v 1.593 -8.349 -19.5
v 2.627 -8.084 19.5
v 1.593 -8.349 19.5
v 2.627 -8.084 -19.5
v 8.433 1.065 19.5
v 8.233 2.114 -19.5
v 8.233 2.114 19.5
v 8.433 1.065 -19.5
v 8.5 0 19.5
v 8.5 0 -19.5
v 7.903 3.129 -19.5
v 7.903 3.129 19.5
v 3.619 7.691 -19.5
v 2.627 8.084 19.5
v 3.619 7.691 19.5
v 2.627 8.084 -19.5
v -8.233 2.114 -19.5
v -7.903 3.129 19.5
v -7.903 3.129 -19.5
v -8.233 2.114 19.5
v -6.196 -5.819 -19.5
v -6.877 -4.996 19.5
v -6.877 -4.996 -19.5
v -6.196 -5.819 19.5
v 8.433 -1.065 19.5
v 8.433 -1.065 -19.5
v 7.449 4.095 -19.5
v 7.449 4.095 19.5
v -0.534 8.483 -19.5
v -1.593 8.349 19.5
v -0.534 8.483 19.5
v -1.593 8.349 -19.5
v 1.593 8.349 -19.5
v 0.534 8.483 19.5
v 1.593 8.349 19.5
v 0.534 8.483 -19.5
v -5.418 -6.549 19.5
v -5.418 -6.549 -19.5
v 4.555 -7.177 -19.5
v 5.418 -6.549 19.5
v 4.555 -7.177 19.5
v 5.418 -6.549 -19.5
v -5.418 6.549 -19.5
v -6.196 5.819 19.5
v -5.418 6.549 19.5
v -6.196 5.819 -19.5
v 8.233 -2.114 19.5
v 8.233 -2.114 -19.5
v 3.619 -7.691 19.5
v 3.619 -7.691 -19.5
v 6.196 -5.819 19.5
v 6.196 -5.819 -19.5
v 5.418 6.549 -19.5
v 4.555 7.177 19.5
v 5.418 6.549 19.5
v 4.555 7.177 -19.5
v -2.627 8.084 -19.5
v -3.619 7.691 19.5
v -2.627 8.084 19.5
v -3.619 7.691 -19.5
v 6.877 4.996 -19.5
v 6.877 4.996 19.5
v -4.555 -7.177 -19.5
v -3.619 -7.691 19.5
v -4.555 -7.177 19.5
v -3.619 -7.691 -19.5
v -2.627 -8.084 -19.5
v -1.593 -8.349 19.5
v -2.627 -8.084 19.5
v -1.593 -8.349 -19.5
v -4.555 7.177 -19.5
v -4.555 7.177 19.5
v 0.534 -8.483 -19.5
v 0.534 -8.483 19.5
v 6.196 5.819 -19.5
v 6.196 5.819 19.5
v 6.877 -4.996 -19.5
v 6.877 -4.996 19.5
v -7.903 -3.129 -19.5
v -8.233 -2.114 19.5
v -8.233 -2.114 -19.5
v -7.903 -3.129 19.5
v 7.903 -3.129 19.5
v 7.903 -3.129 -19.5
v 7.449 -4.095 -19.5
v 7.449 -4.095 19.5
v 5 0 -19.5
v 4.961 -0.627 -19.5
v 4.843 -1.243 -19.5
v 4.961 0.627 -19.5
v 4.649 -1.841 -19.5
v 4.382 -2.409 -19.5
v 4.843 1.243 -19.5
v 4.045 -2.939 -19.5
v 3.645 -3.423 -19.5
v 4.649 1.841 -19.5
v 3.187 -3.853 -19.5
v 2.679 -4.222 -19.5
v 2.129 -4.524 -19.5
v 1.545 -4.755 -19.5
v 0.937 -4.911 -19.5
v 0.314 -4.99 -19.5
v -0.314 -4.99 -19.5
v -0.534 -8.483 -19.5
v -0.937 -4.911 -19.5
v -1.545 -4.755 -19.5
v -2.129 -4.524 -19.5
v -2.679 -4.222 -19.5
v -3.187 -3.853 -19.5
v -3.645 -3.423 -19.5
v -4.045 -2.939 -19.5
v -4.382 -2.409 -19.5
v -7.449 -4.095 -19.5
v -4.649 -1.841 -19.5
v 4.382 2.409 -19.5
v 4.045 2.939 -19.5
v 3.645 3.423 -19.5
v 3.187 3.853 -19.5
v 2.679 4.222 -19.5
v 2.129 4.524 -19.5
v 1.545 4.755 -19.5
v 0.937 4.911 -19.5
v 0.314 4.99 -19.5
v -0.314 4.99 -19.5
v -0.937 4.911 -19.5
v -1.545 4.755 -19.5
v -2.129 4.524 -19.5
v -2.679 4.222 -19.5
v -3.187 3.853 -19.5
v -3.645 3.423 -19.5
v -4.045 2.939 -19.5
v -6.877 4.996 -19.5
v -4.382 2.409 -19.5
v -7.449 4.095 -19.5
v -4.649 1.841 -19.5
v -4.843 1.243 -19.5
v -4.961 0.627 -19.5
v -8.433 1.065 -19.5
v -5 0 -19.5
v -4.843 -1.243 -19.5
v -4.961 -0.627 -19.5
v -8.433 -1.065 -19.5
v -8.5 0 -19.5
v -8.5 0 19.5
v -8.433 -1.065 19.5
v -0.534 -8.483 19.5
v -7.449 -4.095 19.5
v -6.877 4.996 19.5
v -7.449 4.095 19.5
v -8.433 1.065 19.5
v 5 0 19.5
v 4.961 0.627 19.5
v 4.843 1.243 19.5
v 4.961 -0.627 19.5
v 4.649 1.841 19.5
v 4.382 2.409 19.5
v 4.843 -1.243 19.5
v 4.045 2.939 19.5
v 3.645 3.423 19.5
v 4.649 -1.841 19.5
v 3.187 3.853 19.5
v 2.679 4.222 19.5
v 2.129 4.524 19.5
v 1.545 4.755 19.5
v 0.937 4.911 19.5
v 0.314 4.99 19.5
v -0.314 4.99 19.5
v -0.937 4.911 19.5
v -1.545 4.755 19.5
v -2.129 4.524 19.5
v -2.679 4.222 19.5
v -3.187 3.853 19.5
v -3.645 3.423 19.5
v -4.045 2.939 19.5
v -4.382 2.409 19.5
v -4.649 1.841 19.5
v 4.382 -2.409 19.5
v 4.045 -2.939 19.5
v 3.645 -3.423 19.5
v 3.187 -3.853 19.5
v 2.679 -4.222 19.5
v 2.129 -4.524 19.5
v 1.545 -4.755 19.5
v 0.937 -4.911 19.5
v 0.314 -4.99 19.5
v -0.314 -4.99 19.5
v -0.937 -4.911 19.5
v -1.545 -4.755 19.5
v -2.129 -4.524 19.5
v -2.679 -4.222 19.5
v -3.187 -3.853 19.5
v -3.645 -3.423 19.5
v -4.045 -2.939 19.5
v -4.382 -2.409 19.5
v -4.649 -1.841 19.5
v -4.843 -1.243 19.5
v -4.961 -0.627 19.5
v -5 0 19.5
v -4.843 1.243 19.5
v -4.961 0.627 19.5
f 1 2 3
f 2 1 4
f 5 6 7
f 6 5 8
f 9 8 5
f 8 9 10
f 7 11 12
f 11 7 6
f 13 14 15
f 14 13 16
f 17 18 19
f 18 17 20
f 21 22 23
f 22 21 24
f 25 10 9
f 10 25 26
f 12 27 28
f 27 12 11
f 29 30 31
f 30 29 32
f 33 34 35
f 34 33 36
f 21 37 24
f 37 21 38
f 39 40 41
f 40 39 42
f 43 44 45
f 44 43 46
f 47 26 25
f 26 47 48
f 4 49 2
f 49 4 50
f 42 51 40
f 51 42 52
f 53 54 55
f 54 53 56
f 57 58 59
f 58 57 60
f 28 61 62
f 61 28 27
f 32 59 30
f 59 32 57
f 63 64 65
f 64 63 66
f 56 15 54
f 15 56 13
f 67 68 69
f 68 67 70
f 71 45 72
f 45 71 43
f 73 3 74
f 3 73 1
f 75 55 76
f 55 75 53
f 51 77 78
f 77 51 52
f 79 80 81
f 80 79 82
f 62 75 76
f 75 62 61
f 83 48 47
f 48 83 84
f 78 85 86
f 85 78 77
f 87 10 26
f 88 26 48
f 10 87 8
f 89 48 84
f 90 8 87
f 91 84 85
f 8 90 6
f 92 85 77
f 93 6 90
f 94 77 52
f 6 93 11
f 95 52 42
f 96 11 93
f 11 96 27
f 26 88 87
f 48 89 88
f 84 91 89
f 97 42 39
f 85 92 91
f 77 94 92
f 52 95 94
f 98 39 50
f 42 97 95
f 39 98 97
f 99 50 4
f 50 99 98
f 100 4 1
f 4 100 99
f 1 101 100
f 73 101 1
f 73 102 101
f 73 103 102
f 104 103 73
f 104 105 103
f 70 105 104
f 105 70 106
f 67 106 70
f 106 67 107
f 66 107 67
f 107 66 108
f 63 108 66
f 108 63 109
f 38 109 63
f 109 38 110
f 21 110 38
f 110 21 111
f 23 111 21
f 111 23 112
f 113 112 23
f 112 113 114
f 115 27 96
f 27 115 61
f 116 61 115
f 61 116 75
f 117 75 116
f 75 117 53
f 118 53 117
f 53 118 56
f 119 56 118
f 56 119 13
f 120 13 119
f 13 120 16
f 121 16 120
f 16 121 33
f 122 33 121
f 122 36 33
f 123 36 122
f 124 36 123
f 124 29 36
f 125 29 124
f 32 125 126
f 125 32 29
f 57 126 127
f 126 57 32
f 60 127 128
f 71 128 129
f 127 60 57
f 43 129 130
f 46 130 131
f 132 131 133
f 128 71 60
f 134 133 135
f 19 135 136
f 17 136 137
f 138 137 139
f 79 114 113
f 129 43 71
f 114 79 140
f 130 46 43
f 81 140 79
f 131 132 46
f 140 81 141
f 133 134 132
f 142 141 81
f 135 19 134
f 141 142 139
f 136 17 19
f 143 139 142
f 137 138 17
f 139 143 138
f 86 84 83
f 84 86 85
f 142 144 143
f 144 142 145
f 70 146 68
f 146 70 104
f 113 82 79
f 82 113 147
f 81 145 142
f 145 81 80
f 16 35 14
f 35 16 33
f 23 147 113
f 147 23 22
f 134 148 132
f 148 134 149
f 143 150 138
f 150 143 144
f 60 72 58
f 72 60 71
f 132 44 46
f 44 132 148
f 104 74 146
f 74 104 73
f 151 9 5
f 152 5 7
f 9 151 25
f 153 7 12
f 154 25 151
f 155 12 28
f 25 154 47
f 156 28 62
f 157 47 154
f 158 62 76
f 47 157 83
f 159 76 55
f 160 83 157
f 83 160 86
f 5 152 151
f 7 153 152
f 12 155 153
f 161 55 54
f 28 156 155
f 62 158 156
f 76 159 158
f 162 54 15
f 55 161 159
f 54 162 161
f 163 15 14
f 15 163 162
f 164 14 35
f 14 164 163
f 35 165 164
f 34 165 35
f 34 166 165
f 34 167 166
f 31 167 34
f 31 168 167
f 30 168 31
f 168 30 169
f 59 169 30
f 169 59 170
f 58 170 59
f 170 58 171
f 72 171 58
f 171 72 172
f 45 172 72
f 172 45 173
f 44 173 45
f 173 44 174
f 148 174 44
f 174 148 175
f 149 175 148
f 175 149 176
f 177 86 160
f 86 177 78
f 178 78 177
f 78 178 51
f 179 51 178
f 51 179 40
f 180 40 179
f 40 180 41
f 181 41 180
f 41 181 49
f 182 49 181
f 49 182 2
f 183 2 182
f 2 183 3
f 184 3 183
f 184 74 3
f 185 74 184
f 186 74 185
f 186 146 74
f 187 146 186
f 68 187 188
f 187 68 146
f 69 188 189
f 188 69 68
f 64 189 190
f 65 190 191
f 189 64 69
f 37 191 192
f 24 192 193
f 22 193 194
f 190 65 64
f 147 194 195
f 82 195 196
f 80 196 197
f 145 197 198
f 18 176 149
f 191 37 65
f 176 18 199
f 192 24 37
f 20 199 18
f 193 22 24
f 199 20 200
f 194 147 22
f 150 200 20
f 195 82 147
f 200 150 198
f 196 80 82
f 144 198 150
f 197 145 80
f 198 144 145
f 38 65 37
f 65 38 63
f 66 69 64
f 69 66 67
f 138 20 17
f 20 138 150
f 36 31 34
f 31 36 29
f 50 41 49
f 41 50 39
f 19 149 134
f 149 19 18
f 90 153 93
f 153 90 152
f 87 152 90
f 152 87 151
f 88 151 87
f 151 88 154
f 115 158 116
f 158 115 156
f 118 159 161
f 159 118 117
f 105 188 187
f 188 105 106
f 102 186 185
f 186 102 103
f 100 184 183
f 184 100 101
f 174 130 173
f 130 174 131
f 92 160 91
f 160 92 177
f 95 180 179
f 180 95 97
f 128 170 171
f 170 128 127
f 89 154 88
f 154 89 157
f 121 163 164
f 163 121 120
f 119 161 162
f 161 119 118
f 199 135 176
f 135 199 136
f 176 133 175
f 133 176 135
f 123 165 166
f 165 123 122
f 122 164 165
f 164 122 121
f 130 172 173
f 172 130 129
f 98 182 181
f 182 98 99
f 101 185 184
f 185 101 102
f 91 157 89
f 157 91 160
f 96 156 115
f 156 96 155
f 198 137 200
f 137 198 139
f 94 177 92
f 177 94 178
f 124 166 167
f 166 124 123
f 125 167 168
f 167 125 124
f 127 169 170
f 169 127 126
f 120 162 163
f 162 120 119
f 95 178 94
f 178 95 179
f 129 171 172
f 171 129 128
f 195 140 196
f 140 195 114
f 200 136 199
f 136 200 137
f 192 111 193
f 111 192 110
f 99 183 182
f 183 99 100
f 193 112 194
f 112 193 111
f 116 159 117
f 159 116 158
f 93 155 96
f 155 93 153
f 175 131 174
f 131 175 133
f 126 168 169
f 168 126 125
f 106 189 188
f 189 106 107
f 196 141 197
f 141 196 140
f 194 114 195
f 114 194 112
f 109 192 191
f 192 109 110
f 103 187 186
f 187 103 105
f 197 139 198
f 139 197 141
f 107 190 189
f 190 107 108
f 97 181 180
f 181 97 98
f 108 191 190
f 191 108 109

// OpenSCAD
$fn = 50;


difference() {
	union() {
		translate(v = [0, 0, -19.5000000000]) {
			cylinder(h = 39, r = 8.5000000000);
		}
	}
	union() {
		translate(v = [0, 0, -100.0000000000]) {
			cylinder(h = 200, r = 5.0000000000);
		}
	}
}
